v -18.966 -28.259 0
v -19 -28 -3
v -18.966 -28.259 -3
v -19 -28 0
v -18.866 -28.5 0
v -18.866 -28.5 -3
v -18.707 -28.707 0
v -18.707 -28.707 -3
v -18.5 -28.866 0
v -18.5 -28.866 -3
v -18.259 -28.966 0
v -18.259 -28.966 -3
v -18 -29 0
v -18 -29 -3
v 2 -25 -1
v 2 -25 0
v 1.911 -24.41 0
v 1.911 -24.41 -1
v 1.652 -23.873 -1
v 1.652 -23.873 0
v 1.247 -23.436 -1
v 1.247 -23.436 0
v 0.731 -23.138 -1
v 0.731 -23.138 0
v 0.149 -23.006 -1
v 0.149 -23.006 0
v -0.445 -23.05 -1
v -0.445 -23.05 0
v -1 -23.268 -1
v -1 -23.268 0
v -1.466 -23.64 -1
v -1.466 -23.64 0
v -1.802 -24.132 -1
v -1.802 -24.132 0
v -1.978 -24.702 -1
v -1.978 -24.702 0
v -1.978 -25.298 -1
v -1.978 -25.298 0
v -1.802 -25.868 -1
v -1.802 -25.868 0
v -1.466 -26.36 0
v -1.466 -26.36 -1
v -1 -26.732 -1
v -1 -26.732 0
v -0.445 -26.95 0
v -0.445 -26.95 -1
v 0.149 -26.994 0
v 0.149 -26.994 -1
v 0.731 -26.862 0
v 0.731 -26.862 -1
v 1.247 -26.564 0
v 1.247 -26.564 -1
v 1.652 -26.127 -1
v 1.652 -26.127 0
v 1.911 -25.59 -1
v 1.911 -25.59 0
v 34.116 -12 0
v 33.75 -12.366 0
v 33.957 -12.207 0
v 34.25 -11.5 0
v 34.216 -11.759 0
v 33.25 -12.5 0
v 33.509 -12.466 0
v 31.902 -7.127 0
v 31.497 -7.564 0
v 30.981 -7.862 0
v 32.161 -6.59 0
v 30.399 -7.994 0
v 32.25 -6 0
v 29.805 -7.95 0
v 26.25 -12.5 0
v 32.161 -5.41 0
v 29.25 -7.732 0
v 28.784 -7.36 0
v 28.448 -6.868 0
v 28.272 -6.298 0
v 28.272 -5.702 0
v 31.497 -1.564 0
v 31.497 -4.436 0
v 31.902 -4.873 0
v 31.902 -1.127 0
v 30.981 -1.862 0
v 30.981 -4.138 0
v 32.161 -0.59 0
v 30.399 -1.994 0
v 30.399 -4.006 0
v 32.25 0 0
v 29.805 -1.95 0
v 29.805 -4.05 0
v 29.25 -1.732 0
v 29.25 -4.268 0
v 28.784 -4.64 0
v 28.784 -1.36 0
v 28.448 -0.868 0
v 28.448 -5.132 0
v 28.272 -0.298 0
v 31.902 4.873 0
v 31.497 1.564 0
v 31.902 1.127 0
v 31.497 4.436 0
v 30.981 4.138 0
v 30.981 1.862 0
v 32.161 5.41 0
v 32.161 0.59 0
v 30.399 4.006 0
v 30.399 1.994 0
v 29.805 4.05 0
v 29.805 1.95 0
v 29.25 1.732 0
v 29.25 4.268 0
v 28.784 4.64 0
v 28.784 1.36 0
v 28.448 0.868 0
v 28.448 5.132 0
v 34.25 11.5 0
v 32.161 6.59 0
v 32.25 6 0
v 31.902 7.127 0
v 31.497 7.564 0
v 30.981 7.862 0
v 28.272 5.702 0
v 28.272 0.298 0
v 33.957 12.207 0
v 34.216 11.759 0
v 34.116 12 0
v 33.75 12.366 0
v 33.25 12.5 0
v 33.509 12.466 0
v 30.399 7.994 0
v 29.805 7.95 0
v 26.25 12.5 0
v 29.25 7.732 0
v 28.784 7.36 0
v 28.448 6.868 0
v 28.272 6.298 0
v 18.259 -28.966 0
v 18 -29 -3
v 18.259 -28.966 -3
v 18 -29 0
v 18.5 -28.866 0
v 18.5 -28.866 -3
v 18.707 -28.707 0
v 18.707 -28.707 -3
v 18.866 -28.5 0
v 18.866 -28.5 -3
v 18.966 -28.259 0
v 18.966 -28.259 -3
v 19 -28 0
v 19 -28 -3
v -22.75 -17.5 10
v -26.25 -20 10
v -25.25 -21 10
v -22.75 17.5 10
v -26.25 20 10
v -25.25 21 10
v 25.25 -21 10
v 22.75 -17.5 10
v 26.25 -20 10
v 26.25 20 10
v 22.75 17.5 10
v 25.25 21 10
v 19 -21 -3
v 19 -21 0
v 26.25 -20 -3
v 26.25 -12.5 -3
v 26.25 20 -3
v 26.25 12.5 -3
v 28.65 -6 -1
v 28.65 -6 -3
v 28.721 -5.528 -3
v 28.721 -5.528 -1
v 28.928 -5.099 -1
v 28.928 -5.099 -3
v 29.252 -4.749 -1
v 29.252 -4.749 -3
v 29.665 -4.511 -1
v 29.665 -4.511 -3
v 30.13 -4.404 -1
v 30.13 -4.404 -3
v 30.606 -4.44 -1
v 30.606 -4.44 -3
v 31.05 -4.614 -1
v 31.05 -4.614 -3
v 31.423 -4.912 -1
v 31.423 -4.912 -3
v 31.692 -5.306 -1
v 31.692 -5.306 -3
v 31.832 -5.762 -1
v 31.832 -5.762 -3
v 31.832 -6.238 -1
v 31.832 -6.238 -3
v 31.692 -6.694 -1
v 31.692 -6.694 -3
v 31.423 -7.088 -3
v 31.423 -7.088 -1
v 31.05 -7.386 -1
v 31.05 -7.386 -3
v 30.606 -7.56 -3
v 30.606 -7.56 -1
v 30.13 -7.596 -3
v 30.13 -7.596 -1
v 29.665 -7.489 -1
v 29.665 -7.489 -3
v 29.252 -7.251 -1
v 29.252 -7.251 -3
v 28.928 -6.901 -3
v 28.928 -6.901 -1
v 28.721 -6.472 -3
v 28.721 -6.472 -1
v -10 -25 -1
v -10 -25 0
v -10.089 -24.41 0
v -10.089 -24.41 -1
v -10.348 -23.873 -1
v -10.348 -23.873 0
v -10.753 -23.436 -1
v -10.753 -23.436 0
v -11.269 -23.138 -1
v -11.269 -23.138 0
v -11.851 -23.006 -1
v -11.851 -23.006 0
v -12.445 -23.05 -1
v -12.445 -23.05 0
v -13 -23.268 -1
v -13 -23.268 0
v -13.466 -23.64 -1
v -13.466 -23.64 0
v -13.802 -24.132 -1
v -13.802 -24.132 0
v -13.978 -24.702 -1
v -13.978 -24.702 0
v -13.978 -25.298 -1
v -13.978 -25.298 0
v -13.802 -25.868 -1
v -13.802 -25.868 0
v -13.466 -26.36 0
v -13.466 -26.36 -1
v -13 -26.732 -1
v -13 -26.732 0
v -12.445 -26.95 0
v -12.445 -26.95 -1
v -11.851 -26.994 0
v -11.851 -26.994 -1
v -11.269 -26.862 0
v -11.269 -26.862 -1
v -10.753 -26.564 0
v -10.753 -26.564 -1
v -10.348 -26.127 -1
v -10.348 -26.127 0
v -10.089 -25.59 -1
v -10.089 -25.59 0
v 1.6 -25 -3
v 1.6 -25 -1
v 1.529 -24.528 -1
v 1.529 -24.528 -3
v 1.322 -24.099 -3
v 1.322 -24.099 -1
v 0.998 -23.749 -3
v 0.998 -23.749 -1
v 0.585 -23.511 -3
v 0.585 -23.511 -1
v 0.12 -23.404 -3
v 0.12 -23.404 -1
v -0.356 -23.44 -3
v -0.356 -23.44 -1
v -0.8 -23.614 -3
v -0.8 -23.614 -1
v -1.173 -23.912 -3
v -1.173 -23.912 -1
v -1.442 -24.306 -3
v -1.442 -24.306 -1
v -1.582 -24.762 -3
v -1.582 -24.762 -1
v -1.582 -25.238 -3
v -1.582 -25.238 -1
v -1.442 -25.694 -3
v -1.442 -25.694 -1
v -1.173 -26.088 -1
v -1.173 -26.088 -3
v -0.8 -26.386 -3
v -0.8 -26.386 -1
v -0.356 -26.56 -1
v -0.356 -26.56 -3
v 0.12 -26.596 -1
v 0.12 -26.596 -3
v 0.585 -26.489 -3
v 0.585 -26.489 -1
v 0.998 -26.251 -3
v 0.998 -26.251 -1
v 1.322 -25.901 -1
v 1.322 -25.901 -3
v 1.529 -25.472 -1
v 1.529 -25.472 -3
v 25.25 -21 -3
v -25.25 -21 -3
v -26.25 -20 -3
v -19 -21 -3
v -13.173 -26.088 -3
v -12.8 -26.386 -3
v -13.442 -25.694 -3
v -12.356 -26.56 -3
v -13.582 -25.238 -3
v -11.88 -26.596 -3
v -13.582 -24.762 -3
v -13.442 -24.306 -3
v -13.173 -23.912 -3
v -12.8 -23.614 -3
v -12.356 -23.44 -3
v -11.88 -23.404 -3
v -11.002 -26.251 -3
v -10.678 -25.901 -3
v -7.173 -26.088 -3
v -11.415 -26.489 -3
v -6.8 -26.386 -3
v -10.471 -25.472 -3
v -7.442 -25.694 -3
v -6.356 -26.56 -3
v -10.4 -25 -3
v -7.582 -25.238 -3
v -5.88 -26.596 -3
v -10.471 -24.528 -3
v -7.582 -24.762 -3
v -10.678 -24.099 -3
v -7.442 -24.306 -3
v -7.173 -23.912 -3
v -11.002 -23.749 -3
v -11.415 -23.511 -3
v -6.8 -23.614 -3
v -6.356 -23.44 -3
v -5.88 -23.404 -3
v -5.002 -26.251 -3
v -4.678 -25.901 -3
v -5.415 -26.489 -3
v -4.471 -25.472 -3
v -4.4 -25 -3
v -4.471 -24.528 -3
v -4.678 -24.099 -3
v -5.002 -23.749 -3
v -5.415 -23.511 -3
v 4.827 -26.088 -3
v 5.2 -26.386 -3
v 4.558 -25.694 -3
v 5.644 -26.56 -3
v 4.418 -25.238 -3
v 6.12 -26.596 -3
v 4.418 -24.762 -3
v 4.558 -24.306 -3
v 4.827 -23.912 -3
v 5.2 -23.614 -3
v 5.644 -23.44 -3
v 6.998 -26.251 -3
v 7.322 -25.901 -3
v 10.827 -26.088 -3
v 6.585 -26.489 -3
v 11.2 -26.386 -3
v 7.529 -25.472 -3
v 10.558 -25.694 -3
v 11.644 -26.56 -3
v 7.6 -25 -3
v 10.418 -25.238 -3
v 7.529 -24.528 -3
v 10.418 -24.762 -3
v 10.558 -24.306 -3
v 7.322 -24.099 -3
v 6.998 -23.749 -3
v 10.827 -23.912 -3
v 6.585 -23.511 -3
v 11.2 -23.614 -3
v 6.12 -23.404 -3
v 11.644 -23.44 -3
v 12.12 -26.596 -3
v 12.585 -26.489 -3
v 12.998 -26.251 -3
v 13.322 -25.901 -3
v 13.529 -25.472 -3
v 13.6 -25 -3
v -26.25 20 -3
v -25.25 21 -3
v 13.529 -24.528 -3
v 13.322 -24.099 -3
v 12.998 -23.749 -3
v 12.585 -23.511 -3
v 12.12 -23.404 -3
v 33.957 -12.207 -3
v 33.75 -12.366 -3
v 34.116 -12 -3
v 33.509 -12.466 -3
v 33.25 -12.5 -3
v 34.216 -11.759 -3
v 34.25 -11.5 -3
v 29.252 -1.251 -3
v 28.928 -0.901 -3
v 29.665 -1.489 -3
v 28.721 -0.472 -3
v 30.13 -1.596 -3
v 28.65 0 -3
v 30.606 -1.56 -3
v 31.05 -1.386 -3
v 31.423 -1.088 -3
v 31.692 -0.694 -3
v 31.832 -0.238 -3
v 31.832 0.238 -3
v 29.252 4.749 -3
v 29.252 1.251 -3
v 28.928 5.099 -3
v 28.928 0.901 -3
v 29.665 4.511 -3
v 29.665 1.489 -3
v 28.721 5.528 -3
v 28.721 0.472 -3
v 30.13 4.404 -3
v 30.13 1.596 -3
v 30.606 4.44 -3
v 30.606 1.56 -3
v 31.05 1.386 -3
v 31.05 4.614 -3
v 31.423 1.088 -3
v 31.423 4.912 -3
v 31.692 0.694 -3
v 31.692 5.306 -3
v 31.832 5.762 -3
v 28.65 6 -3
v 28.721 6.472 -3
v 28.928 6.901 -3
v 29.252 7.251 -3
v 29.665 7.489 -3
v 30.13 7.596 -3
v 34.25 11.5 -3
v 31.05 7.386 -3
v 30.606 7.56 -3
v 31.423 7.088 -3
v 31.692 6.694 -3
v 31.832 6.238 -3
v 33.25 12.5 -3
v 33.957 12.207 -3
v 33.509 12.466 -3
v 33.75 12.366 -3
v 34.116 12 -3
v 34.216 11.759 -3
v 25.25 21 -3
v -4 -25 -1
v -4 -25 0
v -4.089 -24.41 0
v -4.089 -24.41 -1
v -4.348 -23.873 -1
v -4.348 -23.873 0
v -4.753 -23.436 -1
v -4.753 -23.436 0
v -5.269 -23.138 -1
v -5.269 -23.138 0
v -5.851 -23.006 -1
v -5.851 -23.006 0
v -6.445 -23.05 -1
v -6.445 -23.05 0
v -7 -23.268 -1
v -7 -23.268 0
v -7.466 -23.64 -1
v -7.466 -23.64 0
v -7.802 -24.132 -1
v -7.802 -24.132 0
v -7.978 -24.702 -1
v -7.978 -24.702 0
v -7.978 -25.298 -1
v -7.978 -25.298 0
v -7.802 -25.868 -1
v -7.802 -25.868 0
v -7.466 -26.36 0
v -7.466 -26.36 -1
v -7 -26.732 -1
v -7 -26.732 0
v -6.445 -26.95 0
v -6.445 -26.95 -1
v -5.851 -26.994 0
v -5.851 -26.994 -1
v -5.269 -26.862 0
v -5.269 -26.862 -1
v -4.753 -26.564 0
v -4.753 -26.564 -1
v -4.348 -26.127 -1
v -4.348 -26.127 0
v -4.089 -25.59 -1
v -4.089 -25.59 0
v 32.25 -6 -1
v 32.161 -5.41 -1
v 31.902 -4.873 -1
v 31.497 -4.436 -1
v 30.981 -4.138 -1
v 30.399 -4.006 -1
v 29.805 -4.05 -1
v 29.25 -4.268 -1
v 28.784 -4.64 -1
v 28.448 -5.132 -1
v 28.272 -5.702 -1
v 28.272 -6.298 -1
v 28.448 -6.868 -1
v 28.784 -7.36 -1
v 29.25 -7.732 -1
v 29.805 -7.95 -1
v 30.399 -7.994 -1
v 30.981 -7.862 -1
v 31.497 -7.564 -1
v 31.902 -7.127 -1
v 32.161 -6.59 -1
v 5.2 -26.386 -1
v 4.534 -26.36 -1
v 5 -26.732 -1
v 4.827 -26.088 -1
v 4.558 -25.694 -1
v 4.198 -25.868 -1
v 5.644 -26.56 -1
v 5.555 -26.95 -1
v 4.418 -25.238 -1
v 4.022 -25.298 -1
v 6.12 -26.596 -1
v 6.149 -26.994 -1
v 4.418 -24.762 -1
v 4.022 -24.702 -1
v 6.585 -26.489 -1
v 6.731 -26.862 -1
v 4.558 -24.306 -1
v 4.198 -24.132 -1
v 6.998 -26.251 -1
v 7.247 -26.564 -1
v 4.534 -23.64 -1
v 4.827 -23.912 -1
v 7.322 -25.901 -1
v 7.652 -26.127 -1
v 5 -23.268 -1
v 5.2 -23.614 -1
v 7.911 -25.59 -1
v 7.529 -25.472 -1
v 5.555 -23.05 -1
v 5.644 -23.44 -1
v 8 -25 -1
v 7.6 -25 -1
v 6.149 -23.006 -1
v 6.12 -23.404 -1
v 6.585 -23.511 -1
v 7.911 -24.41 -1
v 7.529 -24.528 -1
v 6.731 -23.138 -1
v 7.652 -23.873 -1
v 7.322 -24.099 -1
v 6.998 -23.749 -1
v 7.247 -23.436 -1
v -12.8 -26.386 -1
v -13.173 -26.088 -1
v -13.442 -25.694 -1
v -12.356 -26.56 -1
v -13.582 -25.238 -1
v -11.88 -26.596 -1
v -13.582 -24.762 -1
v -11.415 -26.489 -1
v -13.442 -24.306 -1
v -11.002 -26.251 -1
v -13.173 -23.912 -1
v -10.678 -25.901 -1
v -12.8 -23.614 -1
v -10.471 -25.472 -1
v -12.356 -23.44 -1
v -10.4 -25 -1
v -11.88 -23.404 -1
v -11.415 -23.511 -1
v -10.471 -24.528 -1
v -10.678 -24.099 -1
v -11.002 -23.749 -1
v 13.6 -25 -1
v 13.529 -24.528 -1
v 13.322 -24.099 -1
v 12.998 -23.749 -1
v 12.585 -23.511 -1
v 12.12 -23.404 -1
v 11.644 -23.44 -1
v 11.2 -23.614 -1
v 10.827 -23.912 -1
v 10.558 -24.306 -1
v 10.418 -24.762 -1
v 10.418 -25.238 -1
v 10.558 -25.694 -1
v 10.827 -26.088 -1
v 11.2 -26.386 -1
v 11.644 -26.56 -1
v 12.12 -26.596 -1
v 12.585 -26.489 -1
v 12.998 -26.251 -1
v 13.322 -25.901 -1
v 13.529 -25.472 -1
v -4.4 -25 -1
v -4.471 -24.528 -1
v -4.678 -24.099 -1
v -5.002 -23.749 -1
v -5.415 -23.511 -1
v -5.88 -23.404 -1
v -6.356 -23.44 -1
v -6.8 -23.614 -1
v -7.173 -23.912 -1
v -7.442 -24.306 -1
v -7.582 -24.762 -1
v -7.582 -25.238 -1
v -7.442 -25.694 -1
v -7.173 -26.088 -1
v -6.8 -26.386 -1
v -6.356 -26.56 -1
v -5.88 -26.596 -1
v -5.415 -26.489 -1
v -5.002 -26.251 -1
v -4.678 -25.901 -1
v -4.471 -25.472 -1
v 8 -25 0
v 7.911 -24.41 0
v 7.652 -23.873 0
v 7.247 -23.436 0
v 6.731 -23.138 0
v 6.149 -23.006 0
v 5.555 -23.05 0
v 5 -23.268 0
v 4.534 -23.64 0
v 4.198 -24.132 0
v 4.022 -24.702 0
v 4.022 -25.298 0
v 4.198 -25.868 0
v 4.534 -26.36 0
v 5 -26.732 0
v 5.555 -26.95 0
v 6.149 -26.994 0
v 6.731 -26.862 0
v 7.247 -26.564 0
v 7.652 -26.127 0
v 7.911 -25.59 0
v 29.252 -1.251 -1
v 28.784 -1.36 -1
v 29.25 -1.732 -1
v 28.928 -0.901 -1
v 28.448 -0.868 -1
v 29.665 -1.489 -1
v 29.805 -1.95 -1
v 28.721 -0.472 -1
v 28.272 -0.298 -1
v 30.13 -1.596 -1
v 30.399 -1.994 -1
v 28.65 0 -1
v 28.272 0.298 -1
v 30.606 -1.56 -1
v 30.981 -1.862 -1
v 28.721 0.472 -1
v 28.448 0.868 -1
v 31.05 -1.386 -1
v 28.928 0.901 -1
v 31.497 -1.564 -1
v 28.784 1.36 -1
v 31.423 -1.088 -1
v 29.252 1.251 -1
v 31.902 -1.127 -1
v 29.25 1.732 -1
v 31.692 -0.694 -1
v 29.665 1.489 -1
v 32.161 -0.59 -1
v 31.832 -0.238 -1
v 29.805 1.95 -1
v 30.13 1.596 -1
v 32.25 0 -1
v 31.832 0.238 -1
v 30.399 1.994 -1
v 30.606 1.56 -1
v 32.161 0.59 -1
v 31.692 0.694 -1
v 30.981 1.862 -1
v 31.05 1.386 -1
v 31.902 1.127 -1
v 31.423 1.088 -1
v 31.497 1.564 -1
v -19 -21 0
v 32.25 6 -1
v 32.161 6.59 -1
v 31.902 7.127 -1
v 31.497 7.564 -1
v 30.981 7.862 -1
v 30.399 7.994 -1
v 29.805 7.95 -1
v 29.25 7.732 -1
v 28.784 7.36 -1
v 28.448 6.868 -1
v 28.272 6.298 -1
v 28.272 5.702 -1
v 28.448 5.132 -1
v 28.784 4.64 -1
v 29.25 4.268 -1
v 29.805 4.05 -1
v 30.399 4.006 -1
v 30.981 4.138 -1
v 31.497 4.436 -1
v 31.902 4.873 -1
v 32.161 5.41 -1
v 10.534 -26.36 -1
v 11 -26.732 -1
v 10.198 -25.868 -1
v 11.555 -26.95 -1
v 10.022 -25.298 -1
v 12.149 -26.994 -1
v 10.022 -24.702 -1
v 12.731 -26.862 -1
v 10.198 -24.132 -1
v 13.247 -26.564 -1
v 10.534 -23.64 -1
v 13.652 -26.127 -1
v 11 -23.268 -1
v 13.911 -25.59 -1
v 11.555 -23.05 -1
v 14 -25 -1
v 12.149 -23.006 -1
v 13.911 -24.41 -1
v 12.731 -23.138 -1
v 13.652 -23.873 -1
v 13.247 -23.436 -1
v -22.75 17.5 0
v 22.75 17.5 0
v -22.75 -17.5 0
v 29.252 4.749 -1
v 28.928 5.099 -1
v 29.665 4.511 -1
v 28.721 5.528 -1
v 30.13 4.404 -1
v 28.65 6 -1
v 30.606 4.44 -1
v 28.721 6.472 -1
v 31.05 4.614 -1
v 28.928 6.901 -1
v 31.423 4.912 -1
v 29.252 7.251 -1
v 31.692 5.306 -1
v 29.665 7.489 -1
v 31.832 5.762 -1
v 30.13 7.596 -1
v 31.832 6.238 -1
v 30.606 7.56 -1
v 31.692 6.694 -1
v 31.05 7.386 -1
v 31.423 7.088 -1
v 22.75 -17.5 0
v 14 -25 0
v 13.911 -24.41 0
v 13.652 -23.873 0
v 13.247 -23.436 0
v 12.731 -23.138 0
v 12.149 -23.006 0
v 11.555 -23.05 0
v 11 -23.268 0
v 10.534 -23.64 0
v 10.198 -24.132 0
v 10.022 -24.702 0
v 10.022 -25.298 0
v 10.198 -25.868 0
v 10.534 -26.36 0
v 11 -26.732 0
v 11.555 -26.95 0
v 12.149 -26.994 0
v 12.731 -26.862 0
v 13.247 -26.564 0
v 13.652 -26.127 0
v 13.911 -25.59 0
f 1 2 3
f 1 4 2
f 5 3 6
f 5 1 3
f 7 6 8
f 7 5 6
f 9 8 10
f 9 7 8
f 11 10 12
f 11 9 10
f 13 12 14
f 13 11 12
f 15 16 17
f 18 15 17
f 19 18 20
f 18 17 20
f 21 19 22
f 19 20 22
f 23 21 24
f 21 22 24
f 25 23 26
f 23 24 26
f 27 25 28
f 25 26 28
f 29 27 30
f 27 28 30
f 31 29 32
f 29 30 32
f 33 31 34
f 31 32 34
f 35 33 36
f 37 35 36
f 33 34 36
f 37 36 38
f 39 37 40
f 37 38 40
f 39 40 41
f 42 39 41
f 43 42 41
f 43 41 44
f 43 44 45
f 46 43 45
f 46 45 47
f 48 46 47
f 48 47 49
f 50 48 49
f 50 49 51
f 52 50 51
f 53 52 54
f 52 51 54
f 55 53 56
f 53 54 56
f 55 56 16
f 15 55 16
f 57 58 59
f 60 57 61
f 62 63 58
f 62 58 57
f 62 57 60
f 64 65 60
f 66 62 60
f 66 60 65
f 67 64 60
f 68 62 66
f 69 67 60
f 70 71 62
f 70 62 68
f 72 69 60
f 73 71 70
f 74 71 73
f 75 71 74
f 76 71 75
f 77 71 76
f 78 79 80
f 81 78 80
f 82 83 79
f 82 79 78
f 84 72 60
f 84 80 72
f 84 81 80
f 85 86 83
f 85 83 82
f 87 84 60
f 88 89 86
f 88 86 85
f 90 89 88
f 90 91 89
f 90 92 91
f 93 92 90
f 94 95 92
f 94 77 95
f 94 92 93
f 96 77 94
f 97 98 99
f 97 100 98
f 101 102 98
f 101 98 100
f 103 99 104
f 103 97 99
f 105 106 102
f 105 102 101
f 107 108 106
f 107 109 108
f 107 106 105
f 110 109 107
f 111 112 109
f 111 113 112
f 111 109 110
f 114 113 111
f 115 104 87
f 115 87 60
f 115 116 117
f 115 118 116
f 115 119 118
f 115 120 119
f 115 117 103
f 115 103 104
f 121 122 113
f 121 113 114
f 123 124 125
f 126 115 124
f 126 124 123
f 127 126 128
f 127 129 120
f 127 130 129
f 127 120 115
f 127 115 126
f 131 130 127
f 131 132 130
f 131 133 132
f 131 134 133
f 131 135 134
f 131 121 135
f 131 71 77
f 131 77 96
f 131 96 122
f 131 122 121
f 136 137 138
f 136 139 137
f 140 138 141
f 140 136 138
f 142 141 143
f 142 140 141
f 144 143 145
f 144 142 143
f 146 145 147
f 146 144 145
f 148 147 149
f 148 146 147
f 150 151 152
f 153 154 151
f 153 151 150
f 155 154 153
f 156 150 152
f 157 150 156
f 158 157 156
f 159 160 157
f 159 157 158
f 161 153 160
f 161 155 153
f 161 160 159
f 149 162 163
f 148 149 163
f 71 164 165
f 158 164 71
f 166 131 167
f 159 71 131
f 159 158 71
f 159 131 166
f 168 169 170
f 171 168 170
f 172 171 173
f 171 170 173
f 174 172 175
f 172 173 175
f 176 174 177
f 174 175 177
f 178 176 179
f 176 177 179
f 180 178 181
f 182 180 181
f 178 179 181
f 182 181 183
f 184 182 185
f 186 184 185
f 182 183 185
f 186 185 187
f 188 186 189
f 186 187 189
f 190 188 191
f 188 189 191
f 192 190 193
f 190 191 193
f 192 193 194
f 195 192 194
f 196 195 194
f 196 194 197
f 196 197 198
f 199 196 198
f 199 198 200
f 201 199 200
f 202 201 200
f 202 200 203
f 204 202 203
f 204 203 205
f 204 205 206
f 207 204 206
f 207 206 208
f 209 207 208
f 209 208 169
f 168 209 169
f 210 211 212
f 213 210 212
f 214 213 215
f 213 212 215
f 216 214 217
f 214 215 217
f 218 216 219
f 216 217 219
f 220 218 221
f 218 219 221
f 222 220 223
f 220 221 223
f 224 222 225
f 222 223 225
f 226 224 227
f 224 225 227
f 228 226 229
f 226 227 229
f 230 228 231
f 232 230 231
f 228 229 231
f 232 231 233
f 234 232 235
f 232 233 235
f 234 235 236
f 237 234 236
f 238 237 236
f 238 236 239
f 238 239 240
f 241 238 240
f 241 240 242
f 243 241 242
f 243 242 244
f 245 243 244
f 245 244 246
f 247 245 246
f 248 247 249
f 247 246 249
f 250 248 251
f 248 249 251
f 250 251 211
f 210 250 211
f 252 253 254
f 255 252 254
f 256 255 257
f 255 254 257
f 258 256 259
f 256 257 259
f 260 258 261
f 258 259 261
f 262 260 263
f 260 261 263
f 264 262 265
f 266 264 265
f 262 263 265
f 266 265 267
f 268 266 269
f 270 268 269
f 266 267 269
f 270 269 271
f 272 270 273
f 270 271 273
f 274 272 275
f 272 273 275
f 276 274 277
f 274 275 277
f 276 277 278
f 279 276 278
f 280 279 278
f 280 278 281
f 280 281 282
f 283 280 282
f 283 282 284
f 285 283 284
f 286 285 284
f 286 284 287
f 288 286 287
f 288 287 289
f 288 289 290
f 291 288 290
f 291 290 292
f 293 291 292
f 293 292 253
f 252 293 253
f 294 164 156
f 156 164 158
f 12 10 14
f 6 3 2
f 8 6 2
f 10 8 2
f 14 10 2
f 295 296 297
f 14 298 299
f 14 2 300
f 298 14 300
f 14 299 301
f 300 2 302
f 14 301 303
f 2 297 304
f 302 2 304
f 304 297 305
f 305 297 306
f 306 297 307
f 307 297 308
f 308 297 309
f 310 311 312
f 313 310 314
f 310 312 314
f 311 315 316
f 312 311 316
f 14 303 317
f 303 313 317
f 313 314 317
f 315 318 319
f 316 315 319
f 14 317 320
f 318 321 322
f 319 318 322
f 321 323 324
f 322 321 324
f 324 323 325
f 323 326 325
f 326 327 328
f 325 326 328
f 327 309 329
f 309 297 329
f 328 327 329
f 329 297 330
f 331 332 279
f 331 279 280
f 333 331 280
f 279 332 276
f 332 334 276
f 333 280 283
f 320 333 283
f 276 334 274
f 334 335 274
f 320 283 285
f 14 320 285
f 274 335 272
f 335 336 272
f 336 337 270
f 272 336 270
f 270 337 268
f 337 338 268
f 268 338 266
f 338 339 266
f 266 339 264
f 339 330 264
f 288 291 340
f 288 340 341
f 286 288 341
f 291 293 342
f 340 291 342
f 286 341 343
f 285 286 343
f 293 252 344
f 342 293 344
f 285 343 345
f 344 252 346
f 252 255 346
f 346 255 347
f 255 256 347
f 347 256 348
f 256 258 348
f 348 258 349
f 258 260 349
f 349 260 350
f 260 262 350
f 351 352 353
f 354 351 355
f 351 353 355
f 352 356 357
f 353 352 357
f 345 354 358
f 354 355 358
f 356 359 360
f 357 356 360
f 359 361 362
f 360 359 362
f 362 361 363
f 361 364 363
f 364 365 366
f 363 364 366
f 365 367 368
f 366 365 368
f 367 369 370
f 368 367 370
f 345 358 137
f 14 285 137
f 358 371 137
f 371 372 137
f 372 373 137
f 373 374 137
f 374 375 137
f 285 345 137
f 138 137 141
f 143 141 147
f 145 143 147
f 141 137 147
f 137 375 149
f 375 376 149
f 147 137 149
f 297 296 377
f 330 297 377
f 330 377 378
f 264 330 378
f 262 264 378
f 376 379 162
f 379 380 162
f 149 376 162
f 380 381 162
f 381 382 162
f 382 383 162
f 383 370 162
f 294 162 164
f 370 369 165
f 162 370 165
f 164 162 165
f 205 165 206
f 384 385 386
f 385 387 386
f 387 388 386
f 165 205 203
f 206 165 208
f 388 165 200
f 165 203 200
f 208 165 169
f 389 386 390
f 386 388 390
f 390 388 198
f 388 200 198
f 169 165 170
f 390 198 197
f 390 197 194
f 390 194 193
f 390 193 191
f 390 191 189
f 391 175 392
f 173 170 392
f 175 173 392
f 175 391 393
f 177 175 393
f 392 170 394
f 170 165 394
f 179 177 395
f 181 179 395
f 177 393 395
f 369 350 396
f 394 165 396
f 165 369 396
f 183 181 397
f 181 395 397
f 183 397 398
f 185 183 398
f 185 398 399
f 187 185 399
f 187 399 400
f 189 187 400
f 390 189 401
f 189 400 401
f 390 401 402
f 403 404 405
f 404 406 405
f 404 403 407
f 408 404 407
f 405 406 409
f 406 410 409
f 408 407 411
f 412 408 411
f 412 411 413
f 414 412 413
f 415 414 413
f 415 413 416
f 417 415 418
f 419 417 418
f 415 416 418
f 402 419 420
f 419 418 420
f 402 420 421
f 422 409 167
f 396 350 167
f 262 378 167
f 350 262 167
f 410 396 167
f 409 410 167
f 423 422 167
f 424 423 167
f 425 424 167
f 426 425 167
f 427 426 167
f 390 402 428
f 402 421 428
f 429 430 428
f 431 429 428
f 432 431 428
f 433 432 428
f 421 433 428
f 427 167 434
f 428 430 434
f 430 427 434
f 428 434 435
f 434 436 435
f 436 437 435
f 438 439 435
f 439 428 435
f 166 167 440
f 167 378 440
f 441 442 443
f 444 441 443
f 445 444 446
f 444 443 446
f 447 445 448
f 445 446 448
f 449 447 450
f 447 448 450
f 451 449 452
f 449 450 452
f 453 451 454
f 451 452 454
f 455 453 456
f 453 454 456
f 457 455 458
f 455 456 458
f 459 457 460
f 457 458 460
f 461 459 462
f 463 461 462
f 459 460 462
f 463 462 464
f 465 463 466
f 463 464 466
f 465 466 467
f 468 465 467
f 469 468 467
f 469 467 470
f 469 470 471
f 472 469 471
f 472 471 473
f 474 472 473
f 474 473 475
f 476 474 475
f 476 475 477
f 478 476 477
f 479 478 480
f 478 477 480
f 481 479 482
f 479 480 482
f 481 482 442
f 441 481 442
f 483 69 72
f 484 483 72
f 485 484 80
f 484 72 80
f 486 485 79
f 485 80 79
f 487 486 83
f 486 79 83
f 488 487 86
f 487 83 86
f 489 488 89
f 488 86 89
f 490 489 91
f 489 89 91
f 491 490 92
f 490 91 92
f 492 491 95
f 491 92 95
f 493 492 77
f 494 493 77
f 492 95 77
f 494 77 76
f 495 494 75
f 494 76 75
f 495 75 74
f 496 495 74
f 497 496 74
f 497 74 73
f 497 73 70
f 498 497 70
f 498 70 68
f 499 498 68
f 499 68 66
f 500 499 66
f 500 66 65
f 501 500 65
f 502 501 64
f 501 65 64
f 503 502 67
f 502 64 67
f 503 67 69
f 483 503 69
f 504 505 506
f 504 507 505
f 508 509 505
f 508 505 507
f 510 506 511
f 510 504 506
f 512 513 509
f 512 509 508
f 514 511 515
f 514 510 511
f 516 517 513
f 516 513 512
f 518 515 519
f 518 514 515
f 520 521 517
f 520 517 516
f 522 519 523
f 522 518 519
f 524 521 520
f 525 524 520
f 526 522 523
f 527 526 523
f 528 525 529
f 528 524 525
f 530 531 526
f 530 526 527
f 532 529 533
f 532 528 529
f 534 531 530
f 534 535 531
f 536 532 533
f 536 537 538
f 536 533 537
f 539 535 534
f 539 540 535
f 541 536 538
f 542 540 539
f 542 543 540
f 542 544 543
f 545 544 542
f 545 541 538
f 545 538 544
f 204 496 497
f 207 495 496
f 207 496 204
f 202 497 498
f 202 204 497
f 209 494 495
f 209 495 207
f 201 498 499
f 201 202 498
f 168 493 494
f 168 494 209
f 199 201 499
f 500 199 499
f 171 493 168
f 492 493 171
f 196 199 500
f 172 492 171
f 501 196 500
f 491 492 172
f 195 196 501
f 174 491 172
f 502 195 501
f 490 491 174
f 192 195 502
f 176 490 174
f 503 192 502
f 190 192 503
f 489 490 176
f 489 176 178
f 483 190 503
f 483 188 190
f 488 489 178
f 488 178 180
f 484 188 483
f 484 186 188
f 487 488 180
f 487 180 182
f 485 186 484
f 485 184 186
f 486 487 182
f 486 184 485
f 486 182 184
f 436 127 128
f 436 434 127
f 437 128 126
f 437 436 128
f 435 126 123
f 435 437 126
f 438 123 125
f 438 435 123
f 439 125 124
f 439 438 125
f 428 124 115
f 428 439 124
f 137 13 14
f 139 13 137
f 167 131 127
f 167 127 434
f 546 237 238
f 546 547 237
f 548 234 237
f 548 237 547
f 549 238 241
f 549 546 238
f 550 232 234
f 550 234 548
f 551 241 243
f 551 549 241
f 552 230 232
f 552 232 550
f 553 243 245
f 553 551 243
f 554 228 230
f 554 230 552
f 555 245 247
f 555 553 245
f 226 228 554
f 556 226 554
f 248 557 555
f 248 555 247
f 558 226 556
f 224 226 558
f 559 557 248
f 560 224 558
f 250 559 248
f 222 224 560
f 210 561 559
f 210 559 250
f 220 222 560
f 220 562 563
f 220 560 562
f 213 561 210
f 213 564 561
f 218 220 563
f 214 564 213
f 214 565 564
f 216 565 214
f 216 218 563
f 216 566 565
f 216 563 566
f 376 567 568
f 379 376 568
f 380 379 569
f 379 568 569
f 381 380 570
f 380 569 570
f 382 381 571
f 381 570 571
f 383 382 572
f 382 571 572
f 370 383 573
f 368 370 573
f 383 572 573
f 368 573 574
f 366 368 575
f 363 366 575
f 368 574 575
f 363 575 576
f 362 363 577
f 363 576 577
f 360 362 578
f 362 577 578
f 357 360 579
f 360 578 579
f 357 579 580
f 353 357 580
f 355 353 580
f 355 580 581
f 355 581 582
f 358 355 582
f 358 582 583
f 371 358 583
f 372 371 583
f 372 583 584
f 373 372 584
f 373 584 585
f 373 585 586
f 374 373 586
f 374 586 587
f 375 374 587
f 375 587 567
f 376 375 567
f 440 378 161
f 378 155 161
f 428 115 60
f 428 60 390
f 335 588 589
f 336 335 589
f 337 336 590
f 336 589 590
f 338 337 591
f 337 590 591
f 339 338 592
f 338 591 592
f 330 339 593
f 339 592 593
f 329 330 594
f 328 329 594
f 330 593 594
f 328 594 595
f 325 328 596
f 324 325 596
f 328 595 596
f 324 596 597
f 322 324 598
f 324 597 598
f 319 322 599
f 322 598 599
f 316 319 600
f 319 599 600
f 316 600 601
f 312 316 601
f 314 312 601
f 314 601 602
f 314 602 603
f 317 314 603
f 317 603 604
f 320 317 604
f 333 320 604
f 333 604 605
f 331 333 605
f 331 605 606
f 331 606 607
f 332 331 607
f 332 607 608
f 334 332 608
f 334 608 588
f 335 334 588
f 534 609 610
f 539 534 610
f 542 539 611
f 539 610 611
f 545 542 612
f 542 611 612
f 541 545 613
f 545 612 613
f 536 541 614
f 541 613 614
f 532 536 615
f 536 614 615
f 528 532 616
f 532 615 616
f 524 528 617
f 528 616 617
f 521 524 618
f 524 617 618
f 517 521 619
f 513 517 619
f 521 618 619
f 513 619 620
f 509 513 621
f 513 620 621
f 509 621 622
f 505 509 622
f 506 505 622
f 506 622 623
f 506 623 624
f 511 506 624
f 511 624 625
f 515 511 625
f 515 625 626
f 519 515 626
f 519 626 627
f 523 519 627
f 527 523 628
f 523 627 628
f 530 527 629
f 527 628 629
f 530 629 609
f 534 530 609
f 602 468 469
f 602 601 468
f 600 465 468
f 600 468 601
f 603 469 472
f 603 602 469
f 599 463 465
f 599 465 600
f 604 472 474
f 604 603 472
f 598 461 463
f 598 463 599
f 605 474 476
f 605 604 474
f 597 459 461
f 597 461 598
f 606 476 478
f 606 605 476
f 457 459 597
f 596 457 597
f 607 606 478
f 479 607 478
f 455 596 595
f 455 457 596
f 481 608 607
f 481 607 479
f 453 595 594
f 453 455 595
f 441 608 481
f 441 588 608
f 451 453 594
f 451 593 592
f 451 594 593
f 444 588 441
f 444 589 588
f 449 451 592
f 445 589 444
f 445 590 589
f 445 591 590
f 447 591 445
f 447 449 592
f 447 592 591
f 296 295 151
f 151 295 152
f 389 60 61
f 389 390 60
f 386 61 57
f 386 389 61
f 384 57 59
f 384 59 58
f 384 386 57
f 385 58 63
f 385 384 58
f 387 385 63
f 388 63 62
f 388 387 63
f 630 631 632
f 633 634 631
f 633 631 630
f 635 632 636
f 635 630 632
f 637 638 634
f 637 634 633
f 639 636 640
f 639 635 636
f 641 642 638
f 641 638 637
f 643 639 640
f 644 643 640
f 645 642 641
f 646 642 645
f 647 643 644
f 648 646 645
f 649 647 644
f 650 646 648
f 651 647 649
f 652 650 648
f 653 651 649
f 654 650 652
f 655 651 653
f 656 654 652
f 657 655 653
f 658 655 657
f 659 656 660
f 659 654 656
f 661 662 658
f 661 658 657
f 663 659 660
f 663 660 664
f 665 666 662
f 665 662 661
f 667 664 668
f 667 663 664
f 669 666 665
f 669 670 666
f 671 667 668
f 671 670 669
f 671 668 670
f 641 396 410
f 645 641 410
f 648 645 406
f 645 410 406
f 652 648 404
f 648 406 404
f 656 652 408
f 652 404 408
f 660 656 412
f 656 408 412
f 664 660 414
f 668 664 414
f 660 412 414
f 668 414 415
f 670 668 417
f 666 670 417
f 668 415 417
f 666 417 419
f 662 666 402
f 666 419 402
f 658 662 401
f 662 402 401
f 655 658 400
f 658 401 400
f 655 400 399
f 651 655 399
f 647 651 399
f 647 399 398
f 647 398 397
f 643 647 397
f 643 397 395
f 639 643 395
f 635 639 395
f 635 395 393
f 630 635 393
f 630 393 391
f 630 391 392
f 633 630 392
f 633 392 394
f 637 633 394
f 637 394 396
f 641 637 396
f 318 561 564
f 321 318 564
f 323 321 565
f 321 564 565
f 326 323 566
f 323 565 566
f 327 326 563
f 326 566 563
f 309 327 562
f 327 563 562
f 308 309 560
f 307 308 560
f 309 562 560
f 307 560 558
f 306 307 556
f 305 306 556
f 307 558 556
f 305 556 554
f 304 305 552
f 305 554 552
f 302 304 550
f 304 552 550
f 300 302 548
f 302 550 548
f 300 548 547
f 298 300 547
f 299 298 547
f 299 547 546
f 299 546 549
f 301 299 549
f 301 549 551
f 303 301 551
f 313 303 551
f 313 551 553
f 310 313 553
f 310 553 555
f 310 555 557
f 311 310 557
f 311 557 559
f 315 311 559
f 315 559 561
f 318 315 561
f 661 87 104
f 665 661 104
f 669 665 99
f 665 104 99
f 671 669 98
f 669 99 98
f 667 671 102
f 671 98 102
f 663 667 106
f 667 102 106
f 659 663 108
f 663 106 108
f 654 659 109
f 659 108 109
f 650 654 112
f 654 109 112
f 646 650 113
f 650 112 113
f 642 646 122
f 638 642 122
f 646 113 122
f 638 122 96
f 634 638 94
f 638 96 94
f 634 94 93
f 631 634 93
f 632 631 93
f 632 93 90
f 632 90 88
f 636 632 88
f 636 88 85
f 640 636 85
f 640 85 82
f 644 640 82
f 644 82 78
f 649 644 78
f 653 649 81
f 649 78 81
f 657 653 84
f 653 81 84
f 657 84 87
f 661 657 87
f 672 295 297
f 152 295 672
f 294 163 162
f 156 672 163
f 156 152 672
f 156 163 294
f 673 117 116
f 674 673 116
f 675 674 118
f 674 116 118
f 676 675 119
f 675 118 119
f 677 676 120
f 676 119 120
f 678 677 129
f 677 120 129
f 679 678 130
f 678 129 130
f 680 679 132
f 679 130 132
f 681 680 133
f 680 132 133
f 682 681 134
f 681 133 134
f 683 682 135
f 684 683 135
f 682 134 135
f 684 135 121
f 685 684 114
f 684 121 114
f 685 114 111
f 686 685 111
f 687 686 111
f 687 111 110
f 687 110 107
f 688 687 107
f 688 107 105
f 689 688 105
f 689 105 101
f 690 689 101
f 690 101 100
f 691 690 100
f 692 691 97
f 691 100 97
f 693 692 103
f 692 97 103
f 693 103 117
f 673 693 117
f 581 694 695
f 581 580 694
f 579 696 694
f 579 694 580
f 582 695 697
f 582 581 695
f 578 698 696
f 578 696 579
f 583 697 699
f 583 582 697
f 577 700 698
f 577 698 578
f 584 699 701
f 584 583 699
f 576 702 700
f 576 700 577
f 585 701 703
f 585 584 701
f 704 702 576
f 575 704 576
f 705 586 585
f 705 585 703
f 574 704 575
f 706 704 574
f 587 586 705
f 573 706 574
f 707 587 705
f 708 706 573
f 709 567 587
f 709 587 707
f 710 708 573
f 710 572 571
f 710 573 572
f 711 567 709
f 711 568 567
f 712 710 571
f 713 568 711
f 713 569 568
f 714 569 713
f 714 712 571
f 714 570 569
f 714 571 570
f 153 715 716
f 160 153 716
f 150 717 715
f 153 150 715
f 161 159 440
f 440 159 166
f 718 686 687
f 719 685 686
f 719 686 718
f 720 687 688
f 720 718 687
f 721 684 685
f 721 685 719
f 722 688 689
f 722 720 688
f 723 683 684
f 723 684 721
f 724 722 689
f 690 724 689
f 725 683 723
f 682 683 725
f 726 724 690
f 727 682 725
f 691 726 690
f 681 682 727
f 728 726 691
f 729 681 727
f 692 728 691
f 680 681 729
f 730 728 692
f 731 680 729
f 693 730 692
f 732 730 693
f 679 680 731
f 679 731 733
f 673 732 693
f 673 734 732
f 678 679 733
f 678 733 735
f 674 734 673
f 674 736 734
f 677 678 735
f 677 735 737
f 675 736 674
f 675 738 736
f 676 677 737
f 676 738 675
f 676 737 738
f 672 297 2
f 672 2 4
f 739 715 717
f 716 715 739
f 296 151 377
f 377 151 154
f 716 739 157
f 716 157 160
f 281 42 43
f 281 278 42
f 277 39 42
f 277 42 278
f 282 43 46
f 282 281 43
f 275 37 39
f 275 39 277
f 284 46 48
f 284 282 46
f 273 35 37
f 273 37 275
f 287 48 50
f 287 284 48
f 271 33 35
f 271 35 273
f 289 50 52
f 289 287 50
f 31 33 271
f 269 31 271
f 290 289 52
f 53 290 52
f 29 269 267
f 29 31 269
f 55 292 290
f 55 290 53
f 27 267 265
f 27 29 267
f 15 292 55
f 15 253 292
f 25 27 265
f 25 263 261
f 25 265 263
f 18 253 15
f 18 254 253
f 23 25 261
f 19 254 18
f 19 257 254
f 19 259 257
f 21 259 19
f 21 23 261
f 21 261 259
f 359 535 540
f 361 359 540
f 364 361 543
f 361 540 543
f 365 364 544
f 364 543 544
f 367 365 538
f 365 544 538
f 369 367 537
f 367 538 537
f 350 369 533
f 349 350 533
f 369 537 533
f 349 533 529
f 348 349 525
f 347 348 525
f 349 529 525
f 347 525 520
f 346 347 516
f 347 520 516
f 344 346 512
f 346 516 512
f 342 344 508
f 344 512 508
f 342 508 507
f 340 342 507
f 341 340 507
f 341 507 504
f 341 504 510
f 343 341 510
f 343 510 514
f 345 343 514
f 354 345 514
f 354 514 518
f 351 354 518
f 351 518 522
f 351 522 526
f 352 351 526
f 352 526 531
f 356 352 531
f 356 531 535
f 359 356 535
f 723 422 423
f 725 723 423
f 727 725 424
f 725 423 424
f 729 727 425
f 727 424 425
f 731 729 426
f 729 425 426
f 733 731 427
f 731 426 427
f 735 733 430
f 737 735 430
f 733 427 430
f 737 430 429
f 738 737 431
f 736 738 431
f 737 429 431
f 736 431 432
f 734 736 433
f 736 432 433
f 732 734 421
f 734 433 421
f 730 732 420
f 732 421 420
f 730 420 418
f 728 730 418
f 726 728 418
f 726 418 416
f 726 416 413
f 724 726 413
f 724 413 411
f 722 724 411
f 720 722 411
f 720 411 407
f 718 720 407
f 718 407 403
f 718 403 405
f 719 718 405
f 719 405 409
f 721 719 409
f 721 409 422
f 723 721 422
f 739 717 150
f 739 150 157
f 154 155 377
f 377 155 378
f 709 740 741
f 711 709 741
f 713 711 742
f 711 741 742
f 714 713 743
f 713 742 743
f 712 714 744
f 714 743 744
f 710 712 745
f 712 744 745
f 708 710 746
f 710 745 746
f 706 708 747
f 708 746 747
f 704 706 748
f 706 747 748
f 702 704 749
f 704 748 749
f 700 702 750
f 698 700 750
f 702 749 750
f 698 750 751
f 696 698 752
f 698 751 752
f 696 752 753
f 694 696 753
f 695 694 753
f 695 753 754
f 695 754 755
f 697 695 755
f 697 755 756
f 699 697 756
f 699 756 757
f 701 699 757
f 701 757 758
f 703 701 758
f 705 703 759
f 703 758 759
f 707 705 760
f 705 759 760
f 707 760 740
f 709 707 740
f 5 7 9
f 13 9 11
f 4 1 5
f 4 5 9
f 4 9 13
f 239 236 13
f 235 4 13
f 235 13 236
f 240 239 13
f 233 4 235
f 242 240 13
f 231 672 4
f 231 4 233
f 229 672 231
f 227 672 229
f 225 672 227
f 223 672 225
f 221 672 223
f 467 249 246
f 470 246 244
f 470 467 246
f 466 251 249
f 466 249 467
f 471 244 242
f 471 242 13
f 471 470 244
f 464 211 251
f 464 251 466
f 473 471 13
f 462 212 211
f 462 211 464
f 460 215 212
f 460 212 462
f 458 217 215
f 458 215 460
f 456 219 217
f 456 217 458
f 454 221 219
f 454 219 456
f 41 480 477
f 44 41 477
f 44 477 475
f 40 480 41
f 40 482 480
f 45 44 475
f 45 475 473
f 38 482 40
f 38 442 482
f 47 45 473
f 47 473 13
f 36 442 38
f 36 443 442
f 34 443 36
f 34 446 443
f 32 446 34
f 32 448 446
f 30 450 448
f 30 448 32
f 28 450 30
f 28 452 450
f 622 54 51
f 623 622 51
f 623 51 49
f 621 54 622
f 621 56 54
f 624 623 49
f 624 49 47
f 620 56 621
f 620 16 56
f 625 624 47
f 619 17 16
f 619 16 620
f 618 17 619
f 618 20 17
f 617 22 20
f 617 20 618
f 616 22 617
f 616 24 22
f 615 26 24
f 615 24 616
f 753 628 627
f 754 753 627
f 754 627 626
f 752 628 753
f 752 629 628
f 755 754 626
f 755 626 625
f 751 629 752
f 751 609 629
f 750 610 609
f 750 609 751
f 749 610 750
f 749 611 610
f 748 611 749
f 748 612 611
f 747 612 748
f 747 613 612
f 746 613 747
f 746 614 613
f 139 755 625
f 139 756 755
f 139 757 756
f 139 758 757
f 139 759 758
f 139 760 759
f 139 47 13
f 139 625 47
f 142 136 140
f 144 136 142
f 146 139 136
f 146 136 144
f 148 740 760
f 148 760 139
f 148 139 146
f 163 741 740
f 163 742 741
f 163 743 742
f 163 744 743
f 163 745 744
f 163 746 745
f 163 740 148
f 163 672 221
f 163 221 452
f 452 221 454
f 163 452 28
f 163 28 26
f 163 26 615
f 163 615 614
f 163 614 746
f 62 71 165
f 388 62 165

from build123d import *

# Parameters (mm, degrees)
CROQUIS1_W              = 52.5
CROQUIS1_H              = 42
CROQUIS1_W_2            = 45.5
CROQUIS1_H_2            = 35
SALIENTE_EXTRUIR1_DEPTH = 10
CROQUIS3_W              = 52.5
CROQUIS3_H              = 42
SALIENTE_EXTRUIR2_DEPTH = 3
CROQUIS4_W              = 38
CROQUIS4_H              = 3
SALIENTE_EXTRUIR3_DEPTH = 8
CROQUIS5_R              = 2
CORTAR_EXTRUIR1_DEPTH   = 1
CROQUIS6_R              = 1.6
CORTAR_EXTRUIR2_DEPTH   = 4
CROQUIS7_W              = 3
CROQUIS7_H              = 25
SALIENTE_EXTRUIR4_DEPTH = 8
CROQUIS8_R              = 2
CORTAR_EXTRUIR3_DEPTH   = 1
CROQUIS9_R              = 1.6
CORTAR_EXTRUIR4_DEPTH   = 3
CHAFL_N1_SIZE           = 1
REDONDEO2_R             = 1


with BuildPart() as part:
    # Croquis1 → Saliente-Extruir1 (new body)
    with BuildSketch(Plane.XY):
        Rectangle(CROQUIS1_W, CROQUIS1_H)
        Rectangle(CROQUIS1_W_2, CROQUIS1_H_2, mode=Mode.SUBTRACT)
    extrude(amount=SALIENTE_EXTRUIR1_DEPTH)

    # Croquis3 → Saliente-Extruir2 (add)
    with BuildSketch(Plane.XY):
        Rectangle(CROQUIS3_W, CROQUIS3_H)
    extrude(amount=-SALIENTE_EXTRUIR2_DEPTH)

    # Croquis4 → Saliente-Extruir3 (add)
    with BuildSketch(Plane.XZ.offset(21)):
        with Locations((0, -1.5)):
            Rectangle(CROQUIS4_W, CROQUIS4_H)
    extrude(amount=SALIENTE_EXTRUIR3_DEPTH)

    # Croquis5 → Cortar-Extruir1 (cut)
    with BuildSketch(Plane.XY):
        with Locations((-12, -25)):
            Circle(CROQUIS5_R)
        with Locations((-6, -25)):
            Circle(CROQUIS5_R)
        with Locations((0, -25)):
            Circle(CROQUIS5_R)
        with Locations((6, -25)):
            Circle(CROQUIS5_R)
        with Locations((12, -25)):
            Circle(CROQUIS5_R)
    extrude(amount=-CORTAR_EXTRUIR1_DEPTH, mode=Mode.SUBTRACT)

    # Croquis6 → Cortar-Extruir2 (cut)
    with BuildSketch(Plane.XY.offset(-1)):
        with Locations((-12, -25)):
            Circle(CROQUIS6_R)
        with Locations((-6, -25)):
            Circle(CROQUIS6_R)
        with Locations((0, -25)):
            Circle(CROQUIS6_R)
        with Locations((6, -25)):
            Circle(CROQUIS6_R)
        with Locations((12, -25)):
            Circle(CROQUIS6_R)
    extrude(amount=-CORTAR_EXTRUIR2_DEPTH, mode=Mode.SUBTRACT)

    # Croquis7 → Saliente-Extruir4 (add)
    with BuildSketch(Plane(origin=(26.25, 0, 0), x_dir=(0, 0, -1), z_dir=(1, 0, 0))):
        with Locations((1.5, 0)):
            Rectangle(CROQUIS7_W, CROQUIS7_H)
    extrude(amount=SALIENTE_EXTRUIR4_DEPTH)

    # Croquis8 → Cortar-Extruir3 (cut)
    with BuildSketch(Plane.XY):
        with Locations((30.25, 6)):
            Circle(CROQUIS8_R)
        with Locations((30.25, 0)):
            Circle(CROQUIS8_R)
        with Locations((30.25, -6)):
            Circle(CROQUIS8_R)
    extrude(amount=-CORTAR_EXTRUIR3_DEPTH, mode=Mode.SUBTRACT)

    # Croquis9 → Cortar-Extruir4 (cut)
    with BuildSketch(Plane(origin=(0, 0, -3), x_dir=(-1, 0, 0), z_dir=(0, 0, -1))):
        with Locations((-30.25, 6)):
            Circle(CROQUIS9_R)
        with Locations((-30.25, 0)):
            Circle(CROQUIS9_R)
        with Locations((-30.25, -6)):
            Circle(CROQUIS9_R)
    extrude(amount=-CORTAR_EXTRUIR4_DEPTH, mode=Mode.SUBTRACT)

    # Chaflán1
    chafl_n1_edges = [part.edges().sort_by_distance(p)[0] for p in [
        (26.25, -21, 3.5),
        (-26.25, -21, 3.5),
        (-26.25, 21, 3.5),
        (26.25, 21, 3.5),
    ]]
    chamfer(chafl_n1_edges, length=CHAFL_N1_SIZE)

    # Redondeo2
    redondeo2_edges = [part.edges().sort_by_distance(p)[0] for p in [
        (34.25, 12.5, -1.5),
        (34.25, -12.5, -1.5),
        (19, -29, -1.5),
        (-19, -29, -1.5),
    ]]
    fillet(redondeo2_edges, radius=REDONDEO2_R)


solid = part.part
